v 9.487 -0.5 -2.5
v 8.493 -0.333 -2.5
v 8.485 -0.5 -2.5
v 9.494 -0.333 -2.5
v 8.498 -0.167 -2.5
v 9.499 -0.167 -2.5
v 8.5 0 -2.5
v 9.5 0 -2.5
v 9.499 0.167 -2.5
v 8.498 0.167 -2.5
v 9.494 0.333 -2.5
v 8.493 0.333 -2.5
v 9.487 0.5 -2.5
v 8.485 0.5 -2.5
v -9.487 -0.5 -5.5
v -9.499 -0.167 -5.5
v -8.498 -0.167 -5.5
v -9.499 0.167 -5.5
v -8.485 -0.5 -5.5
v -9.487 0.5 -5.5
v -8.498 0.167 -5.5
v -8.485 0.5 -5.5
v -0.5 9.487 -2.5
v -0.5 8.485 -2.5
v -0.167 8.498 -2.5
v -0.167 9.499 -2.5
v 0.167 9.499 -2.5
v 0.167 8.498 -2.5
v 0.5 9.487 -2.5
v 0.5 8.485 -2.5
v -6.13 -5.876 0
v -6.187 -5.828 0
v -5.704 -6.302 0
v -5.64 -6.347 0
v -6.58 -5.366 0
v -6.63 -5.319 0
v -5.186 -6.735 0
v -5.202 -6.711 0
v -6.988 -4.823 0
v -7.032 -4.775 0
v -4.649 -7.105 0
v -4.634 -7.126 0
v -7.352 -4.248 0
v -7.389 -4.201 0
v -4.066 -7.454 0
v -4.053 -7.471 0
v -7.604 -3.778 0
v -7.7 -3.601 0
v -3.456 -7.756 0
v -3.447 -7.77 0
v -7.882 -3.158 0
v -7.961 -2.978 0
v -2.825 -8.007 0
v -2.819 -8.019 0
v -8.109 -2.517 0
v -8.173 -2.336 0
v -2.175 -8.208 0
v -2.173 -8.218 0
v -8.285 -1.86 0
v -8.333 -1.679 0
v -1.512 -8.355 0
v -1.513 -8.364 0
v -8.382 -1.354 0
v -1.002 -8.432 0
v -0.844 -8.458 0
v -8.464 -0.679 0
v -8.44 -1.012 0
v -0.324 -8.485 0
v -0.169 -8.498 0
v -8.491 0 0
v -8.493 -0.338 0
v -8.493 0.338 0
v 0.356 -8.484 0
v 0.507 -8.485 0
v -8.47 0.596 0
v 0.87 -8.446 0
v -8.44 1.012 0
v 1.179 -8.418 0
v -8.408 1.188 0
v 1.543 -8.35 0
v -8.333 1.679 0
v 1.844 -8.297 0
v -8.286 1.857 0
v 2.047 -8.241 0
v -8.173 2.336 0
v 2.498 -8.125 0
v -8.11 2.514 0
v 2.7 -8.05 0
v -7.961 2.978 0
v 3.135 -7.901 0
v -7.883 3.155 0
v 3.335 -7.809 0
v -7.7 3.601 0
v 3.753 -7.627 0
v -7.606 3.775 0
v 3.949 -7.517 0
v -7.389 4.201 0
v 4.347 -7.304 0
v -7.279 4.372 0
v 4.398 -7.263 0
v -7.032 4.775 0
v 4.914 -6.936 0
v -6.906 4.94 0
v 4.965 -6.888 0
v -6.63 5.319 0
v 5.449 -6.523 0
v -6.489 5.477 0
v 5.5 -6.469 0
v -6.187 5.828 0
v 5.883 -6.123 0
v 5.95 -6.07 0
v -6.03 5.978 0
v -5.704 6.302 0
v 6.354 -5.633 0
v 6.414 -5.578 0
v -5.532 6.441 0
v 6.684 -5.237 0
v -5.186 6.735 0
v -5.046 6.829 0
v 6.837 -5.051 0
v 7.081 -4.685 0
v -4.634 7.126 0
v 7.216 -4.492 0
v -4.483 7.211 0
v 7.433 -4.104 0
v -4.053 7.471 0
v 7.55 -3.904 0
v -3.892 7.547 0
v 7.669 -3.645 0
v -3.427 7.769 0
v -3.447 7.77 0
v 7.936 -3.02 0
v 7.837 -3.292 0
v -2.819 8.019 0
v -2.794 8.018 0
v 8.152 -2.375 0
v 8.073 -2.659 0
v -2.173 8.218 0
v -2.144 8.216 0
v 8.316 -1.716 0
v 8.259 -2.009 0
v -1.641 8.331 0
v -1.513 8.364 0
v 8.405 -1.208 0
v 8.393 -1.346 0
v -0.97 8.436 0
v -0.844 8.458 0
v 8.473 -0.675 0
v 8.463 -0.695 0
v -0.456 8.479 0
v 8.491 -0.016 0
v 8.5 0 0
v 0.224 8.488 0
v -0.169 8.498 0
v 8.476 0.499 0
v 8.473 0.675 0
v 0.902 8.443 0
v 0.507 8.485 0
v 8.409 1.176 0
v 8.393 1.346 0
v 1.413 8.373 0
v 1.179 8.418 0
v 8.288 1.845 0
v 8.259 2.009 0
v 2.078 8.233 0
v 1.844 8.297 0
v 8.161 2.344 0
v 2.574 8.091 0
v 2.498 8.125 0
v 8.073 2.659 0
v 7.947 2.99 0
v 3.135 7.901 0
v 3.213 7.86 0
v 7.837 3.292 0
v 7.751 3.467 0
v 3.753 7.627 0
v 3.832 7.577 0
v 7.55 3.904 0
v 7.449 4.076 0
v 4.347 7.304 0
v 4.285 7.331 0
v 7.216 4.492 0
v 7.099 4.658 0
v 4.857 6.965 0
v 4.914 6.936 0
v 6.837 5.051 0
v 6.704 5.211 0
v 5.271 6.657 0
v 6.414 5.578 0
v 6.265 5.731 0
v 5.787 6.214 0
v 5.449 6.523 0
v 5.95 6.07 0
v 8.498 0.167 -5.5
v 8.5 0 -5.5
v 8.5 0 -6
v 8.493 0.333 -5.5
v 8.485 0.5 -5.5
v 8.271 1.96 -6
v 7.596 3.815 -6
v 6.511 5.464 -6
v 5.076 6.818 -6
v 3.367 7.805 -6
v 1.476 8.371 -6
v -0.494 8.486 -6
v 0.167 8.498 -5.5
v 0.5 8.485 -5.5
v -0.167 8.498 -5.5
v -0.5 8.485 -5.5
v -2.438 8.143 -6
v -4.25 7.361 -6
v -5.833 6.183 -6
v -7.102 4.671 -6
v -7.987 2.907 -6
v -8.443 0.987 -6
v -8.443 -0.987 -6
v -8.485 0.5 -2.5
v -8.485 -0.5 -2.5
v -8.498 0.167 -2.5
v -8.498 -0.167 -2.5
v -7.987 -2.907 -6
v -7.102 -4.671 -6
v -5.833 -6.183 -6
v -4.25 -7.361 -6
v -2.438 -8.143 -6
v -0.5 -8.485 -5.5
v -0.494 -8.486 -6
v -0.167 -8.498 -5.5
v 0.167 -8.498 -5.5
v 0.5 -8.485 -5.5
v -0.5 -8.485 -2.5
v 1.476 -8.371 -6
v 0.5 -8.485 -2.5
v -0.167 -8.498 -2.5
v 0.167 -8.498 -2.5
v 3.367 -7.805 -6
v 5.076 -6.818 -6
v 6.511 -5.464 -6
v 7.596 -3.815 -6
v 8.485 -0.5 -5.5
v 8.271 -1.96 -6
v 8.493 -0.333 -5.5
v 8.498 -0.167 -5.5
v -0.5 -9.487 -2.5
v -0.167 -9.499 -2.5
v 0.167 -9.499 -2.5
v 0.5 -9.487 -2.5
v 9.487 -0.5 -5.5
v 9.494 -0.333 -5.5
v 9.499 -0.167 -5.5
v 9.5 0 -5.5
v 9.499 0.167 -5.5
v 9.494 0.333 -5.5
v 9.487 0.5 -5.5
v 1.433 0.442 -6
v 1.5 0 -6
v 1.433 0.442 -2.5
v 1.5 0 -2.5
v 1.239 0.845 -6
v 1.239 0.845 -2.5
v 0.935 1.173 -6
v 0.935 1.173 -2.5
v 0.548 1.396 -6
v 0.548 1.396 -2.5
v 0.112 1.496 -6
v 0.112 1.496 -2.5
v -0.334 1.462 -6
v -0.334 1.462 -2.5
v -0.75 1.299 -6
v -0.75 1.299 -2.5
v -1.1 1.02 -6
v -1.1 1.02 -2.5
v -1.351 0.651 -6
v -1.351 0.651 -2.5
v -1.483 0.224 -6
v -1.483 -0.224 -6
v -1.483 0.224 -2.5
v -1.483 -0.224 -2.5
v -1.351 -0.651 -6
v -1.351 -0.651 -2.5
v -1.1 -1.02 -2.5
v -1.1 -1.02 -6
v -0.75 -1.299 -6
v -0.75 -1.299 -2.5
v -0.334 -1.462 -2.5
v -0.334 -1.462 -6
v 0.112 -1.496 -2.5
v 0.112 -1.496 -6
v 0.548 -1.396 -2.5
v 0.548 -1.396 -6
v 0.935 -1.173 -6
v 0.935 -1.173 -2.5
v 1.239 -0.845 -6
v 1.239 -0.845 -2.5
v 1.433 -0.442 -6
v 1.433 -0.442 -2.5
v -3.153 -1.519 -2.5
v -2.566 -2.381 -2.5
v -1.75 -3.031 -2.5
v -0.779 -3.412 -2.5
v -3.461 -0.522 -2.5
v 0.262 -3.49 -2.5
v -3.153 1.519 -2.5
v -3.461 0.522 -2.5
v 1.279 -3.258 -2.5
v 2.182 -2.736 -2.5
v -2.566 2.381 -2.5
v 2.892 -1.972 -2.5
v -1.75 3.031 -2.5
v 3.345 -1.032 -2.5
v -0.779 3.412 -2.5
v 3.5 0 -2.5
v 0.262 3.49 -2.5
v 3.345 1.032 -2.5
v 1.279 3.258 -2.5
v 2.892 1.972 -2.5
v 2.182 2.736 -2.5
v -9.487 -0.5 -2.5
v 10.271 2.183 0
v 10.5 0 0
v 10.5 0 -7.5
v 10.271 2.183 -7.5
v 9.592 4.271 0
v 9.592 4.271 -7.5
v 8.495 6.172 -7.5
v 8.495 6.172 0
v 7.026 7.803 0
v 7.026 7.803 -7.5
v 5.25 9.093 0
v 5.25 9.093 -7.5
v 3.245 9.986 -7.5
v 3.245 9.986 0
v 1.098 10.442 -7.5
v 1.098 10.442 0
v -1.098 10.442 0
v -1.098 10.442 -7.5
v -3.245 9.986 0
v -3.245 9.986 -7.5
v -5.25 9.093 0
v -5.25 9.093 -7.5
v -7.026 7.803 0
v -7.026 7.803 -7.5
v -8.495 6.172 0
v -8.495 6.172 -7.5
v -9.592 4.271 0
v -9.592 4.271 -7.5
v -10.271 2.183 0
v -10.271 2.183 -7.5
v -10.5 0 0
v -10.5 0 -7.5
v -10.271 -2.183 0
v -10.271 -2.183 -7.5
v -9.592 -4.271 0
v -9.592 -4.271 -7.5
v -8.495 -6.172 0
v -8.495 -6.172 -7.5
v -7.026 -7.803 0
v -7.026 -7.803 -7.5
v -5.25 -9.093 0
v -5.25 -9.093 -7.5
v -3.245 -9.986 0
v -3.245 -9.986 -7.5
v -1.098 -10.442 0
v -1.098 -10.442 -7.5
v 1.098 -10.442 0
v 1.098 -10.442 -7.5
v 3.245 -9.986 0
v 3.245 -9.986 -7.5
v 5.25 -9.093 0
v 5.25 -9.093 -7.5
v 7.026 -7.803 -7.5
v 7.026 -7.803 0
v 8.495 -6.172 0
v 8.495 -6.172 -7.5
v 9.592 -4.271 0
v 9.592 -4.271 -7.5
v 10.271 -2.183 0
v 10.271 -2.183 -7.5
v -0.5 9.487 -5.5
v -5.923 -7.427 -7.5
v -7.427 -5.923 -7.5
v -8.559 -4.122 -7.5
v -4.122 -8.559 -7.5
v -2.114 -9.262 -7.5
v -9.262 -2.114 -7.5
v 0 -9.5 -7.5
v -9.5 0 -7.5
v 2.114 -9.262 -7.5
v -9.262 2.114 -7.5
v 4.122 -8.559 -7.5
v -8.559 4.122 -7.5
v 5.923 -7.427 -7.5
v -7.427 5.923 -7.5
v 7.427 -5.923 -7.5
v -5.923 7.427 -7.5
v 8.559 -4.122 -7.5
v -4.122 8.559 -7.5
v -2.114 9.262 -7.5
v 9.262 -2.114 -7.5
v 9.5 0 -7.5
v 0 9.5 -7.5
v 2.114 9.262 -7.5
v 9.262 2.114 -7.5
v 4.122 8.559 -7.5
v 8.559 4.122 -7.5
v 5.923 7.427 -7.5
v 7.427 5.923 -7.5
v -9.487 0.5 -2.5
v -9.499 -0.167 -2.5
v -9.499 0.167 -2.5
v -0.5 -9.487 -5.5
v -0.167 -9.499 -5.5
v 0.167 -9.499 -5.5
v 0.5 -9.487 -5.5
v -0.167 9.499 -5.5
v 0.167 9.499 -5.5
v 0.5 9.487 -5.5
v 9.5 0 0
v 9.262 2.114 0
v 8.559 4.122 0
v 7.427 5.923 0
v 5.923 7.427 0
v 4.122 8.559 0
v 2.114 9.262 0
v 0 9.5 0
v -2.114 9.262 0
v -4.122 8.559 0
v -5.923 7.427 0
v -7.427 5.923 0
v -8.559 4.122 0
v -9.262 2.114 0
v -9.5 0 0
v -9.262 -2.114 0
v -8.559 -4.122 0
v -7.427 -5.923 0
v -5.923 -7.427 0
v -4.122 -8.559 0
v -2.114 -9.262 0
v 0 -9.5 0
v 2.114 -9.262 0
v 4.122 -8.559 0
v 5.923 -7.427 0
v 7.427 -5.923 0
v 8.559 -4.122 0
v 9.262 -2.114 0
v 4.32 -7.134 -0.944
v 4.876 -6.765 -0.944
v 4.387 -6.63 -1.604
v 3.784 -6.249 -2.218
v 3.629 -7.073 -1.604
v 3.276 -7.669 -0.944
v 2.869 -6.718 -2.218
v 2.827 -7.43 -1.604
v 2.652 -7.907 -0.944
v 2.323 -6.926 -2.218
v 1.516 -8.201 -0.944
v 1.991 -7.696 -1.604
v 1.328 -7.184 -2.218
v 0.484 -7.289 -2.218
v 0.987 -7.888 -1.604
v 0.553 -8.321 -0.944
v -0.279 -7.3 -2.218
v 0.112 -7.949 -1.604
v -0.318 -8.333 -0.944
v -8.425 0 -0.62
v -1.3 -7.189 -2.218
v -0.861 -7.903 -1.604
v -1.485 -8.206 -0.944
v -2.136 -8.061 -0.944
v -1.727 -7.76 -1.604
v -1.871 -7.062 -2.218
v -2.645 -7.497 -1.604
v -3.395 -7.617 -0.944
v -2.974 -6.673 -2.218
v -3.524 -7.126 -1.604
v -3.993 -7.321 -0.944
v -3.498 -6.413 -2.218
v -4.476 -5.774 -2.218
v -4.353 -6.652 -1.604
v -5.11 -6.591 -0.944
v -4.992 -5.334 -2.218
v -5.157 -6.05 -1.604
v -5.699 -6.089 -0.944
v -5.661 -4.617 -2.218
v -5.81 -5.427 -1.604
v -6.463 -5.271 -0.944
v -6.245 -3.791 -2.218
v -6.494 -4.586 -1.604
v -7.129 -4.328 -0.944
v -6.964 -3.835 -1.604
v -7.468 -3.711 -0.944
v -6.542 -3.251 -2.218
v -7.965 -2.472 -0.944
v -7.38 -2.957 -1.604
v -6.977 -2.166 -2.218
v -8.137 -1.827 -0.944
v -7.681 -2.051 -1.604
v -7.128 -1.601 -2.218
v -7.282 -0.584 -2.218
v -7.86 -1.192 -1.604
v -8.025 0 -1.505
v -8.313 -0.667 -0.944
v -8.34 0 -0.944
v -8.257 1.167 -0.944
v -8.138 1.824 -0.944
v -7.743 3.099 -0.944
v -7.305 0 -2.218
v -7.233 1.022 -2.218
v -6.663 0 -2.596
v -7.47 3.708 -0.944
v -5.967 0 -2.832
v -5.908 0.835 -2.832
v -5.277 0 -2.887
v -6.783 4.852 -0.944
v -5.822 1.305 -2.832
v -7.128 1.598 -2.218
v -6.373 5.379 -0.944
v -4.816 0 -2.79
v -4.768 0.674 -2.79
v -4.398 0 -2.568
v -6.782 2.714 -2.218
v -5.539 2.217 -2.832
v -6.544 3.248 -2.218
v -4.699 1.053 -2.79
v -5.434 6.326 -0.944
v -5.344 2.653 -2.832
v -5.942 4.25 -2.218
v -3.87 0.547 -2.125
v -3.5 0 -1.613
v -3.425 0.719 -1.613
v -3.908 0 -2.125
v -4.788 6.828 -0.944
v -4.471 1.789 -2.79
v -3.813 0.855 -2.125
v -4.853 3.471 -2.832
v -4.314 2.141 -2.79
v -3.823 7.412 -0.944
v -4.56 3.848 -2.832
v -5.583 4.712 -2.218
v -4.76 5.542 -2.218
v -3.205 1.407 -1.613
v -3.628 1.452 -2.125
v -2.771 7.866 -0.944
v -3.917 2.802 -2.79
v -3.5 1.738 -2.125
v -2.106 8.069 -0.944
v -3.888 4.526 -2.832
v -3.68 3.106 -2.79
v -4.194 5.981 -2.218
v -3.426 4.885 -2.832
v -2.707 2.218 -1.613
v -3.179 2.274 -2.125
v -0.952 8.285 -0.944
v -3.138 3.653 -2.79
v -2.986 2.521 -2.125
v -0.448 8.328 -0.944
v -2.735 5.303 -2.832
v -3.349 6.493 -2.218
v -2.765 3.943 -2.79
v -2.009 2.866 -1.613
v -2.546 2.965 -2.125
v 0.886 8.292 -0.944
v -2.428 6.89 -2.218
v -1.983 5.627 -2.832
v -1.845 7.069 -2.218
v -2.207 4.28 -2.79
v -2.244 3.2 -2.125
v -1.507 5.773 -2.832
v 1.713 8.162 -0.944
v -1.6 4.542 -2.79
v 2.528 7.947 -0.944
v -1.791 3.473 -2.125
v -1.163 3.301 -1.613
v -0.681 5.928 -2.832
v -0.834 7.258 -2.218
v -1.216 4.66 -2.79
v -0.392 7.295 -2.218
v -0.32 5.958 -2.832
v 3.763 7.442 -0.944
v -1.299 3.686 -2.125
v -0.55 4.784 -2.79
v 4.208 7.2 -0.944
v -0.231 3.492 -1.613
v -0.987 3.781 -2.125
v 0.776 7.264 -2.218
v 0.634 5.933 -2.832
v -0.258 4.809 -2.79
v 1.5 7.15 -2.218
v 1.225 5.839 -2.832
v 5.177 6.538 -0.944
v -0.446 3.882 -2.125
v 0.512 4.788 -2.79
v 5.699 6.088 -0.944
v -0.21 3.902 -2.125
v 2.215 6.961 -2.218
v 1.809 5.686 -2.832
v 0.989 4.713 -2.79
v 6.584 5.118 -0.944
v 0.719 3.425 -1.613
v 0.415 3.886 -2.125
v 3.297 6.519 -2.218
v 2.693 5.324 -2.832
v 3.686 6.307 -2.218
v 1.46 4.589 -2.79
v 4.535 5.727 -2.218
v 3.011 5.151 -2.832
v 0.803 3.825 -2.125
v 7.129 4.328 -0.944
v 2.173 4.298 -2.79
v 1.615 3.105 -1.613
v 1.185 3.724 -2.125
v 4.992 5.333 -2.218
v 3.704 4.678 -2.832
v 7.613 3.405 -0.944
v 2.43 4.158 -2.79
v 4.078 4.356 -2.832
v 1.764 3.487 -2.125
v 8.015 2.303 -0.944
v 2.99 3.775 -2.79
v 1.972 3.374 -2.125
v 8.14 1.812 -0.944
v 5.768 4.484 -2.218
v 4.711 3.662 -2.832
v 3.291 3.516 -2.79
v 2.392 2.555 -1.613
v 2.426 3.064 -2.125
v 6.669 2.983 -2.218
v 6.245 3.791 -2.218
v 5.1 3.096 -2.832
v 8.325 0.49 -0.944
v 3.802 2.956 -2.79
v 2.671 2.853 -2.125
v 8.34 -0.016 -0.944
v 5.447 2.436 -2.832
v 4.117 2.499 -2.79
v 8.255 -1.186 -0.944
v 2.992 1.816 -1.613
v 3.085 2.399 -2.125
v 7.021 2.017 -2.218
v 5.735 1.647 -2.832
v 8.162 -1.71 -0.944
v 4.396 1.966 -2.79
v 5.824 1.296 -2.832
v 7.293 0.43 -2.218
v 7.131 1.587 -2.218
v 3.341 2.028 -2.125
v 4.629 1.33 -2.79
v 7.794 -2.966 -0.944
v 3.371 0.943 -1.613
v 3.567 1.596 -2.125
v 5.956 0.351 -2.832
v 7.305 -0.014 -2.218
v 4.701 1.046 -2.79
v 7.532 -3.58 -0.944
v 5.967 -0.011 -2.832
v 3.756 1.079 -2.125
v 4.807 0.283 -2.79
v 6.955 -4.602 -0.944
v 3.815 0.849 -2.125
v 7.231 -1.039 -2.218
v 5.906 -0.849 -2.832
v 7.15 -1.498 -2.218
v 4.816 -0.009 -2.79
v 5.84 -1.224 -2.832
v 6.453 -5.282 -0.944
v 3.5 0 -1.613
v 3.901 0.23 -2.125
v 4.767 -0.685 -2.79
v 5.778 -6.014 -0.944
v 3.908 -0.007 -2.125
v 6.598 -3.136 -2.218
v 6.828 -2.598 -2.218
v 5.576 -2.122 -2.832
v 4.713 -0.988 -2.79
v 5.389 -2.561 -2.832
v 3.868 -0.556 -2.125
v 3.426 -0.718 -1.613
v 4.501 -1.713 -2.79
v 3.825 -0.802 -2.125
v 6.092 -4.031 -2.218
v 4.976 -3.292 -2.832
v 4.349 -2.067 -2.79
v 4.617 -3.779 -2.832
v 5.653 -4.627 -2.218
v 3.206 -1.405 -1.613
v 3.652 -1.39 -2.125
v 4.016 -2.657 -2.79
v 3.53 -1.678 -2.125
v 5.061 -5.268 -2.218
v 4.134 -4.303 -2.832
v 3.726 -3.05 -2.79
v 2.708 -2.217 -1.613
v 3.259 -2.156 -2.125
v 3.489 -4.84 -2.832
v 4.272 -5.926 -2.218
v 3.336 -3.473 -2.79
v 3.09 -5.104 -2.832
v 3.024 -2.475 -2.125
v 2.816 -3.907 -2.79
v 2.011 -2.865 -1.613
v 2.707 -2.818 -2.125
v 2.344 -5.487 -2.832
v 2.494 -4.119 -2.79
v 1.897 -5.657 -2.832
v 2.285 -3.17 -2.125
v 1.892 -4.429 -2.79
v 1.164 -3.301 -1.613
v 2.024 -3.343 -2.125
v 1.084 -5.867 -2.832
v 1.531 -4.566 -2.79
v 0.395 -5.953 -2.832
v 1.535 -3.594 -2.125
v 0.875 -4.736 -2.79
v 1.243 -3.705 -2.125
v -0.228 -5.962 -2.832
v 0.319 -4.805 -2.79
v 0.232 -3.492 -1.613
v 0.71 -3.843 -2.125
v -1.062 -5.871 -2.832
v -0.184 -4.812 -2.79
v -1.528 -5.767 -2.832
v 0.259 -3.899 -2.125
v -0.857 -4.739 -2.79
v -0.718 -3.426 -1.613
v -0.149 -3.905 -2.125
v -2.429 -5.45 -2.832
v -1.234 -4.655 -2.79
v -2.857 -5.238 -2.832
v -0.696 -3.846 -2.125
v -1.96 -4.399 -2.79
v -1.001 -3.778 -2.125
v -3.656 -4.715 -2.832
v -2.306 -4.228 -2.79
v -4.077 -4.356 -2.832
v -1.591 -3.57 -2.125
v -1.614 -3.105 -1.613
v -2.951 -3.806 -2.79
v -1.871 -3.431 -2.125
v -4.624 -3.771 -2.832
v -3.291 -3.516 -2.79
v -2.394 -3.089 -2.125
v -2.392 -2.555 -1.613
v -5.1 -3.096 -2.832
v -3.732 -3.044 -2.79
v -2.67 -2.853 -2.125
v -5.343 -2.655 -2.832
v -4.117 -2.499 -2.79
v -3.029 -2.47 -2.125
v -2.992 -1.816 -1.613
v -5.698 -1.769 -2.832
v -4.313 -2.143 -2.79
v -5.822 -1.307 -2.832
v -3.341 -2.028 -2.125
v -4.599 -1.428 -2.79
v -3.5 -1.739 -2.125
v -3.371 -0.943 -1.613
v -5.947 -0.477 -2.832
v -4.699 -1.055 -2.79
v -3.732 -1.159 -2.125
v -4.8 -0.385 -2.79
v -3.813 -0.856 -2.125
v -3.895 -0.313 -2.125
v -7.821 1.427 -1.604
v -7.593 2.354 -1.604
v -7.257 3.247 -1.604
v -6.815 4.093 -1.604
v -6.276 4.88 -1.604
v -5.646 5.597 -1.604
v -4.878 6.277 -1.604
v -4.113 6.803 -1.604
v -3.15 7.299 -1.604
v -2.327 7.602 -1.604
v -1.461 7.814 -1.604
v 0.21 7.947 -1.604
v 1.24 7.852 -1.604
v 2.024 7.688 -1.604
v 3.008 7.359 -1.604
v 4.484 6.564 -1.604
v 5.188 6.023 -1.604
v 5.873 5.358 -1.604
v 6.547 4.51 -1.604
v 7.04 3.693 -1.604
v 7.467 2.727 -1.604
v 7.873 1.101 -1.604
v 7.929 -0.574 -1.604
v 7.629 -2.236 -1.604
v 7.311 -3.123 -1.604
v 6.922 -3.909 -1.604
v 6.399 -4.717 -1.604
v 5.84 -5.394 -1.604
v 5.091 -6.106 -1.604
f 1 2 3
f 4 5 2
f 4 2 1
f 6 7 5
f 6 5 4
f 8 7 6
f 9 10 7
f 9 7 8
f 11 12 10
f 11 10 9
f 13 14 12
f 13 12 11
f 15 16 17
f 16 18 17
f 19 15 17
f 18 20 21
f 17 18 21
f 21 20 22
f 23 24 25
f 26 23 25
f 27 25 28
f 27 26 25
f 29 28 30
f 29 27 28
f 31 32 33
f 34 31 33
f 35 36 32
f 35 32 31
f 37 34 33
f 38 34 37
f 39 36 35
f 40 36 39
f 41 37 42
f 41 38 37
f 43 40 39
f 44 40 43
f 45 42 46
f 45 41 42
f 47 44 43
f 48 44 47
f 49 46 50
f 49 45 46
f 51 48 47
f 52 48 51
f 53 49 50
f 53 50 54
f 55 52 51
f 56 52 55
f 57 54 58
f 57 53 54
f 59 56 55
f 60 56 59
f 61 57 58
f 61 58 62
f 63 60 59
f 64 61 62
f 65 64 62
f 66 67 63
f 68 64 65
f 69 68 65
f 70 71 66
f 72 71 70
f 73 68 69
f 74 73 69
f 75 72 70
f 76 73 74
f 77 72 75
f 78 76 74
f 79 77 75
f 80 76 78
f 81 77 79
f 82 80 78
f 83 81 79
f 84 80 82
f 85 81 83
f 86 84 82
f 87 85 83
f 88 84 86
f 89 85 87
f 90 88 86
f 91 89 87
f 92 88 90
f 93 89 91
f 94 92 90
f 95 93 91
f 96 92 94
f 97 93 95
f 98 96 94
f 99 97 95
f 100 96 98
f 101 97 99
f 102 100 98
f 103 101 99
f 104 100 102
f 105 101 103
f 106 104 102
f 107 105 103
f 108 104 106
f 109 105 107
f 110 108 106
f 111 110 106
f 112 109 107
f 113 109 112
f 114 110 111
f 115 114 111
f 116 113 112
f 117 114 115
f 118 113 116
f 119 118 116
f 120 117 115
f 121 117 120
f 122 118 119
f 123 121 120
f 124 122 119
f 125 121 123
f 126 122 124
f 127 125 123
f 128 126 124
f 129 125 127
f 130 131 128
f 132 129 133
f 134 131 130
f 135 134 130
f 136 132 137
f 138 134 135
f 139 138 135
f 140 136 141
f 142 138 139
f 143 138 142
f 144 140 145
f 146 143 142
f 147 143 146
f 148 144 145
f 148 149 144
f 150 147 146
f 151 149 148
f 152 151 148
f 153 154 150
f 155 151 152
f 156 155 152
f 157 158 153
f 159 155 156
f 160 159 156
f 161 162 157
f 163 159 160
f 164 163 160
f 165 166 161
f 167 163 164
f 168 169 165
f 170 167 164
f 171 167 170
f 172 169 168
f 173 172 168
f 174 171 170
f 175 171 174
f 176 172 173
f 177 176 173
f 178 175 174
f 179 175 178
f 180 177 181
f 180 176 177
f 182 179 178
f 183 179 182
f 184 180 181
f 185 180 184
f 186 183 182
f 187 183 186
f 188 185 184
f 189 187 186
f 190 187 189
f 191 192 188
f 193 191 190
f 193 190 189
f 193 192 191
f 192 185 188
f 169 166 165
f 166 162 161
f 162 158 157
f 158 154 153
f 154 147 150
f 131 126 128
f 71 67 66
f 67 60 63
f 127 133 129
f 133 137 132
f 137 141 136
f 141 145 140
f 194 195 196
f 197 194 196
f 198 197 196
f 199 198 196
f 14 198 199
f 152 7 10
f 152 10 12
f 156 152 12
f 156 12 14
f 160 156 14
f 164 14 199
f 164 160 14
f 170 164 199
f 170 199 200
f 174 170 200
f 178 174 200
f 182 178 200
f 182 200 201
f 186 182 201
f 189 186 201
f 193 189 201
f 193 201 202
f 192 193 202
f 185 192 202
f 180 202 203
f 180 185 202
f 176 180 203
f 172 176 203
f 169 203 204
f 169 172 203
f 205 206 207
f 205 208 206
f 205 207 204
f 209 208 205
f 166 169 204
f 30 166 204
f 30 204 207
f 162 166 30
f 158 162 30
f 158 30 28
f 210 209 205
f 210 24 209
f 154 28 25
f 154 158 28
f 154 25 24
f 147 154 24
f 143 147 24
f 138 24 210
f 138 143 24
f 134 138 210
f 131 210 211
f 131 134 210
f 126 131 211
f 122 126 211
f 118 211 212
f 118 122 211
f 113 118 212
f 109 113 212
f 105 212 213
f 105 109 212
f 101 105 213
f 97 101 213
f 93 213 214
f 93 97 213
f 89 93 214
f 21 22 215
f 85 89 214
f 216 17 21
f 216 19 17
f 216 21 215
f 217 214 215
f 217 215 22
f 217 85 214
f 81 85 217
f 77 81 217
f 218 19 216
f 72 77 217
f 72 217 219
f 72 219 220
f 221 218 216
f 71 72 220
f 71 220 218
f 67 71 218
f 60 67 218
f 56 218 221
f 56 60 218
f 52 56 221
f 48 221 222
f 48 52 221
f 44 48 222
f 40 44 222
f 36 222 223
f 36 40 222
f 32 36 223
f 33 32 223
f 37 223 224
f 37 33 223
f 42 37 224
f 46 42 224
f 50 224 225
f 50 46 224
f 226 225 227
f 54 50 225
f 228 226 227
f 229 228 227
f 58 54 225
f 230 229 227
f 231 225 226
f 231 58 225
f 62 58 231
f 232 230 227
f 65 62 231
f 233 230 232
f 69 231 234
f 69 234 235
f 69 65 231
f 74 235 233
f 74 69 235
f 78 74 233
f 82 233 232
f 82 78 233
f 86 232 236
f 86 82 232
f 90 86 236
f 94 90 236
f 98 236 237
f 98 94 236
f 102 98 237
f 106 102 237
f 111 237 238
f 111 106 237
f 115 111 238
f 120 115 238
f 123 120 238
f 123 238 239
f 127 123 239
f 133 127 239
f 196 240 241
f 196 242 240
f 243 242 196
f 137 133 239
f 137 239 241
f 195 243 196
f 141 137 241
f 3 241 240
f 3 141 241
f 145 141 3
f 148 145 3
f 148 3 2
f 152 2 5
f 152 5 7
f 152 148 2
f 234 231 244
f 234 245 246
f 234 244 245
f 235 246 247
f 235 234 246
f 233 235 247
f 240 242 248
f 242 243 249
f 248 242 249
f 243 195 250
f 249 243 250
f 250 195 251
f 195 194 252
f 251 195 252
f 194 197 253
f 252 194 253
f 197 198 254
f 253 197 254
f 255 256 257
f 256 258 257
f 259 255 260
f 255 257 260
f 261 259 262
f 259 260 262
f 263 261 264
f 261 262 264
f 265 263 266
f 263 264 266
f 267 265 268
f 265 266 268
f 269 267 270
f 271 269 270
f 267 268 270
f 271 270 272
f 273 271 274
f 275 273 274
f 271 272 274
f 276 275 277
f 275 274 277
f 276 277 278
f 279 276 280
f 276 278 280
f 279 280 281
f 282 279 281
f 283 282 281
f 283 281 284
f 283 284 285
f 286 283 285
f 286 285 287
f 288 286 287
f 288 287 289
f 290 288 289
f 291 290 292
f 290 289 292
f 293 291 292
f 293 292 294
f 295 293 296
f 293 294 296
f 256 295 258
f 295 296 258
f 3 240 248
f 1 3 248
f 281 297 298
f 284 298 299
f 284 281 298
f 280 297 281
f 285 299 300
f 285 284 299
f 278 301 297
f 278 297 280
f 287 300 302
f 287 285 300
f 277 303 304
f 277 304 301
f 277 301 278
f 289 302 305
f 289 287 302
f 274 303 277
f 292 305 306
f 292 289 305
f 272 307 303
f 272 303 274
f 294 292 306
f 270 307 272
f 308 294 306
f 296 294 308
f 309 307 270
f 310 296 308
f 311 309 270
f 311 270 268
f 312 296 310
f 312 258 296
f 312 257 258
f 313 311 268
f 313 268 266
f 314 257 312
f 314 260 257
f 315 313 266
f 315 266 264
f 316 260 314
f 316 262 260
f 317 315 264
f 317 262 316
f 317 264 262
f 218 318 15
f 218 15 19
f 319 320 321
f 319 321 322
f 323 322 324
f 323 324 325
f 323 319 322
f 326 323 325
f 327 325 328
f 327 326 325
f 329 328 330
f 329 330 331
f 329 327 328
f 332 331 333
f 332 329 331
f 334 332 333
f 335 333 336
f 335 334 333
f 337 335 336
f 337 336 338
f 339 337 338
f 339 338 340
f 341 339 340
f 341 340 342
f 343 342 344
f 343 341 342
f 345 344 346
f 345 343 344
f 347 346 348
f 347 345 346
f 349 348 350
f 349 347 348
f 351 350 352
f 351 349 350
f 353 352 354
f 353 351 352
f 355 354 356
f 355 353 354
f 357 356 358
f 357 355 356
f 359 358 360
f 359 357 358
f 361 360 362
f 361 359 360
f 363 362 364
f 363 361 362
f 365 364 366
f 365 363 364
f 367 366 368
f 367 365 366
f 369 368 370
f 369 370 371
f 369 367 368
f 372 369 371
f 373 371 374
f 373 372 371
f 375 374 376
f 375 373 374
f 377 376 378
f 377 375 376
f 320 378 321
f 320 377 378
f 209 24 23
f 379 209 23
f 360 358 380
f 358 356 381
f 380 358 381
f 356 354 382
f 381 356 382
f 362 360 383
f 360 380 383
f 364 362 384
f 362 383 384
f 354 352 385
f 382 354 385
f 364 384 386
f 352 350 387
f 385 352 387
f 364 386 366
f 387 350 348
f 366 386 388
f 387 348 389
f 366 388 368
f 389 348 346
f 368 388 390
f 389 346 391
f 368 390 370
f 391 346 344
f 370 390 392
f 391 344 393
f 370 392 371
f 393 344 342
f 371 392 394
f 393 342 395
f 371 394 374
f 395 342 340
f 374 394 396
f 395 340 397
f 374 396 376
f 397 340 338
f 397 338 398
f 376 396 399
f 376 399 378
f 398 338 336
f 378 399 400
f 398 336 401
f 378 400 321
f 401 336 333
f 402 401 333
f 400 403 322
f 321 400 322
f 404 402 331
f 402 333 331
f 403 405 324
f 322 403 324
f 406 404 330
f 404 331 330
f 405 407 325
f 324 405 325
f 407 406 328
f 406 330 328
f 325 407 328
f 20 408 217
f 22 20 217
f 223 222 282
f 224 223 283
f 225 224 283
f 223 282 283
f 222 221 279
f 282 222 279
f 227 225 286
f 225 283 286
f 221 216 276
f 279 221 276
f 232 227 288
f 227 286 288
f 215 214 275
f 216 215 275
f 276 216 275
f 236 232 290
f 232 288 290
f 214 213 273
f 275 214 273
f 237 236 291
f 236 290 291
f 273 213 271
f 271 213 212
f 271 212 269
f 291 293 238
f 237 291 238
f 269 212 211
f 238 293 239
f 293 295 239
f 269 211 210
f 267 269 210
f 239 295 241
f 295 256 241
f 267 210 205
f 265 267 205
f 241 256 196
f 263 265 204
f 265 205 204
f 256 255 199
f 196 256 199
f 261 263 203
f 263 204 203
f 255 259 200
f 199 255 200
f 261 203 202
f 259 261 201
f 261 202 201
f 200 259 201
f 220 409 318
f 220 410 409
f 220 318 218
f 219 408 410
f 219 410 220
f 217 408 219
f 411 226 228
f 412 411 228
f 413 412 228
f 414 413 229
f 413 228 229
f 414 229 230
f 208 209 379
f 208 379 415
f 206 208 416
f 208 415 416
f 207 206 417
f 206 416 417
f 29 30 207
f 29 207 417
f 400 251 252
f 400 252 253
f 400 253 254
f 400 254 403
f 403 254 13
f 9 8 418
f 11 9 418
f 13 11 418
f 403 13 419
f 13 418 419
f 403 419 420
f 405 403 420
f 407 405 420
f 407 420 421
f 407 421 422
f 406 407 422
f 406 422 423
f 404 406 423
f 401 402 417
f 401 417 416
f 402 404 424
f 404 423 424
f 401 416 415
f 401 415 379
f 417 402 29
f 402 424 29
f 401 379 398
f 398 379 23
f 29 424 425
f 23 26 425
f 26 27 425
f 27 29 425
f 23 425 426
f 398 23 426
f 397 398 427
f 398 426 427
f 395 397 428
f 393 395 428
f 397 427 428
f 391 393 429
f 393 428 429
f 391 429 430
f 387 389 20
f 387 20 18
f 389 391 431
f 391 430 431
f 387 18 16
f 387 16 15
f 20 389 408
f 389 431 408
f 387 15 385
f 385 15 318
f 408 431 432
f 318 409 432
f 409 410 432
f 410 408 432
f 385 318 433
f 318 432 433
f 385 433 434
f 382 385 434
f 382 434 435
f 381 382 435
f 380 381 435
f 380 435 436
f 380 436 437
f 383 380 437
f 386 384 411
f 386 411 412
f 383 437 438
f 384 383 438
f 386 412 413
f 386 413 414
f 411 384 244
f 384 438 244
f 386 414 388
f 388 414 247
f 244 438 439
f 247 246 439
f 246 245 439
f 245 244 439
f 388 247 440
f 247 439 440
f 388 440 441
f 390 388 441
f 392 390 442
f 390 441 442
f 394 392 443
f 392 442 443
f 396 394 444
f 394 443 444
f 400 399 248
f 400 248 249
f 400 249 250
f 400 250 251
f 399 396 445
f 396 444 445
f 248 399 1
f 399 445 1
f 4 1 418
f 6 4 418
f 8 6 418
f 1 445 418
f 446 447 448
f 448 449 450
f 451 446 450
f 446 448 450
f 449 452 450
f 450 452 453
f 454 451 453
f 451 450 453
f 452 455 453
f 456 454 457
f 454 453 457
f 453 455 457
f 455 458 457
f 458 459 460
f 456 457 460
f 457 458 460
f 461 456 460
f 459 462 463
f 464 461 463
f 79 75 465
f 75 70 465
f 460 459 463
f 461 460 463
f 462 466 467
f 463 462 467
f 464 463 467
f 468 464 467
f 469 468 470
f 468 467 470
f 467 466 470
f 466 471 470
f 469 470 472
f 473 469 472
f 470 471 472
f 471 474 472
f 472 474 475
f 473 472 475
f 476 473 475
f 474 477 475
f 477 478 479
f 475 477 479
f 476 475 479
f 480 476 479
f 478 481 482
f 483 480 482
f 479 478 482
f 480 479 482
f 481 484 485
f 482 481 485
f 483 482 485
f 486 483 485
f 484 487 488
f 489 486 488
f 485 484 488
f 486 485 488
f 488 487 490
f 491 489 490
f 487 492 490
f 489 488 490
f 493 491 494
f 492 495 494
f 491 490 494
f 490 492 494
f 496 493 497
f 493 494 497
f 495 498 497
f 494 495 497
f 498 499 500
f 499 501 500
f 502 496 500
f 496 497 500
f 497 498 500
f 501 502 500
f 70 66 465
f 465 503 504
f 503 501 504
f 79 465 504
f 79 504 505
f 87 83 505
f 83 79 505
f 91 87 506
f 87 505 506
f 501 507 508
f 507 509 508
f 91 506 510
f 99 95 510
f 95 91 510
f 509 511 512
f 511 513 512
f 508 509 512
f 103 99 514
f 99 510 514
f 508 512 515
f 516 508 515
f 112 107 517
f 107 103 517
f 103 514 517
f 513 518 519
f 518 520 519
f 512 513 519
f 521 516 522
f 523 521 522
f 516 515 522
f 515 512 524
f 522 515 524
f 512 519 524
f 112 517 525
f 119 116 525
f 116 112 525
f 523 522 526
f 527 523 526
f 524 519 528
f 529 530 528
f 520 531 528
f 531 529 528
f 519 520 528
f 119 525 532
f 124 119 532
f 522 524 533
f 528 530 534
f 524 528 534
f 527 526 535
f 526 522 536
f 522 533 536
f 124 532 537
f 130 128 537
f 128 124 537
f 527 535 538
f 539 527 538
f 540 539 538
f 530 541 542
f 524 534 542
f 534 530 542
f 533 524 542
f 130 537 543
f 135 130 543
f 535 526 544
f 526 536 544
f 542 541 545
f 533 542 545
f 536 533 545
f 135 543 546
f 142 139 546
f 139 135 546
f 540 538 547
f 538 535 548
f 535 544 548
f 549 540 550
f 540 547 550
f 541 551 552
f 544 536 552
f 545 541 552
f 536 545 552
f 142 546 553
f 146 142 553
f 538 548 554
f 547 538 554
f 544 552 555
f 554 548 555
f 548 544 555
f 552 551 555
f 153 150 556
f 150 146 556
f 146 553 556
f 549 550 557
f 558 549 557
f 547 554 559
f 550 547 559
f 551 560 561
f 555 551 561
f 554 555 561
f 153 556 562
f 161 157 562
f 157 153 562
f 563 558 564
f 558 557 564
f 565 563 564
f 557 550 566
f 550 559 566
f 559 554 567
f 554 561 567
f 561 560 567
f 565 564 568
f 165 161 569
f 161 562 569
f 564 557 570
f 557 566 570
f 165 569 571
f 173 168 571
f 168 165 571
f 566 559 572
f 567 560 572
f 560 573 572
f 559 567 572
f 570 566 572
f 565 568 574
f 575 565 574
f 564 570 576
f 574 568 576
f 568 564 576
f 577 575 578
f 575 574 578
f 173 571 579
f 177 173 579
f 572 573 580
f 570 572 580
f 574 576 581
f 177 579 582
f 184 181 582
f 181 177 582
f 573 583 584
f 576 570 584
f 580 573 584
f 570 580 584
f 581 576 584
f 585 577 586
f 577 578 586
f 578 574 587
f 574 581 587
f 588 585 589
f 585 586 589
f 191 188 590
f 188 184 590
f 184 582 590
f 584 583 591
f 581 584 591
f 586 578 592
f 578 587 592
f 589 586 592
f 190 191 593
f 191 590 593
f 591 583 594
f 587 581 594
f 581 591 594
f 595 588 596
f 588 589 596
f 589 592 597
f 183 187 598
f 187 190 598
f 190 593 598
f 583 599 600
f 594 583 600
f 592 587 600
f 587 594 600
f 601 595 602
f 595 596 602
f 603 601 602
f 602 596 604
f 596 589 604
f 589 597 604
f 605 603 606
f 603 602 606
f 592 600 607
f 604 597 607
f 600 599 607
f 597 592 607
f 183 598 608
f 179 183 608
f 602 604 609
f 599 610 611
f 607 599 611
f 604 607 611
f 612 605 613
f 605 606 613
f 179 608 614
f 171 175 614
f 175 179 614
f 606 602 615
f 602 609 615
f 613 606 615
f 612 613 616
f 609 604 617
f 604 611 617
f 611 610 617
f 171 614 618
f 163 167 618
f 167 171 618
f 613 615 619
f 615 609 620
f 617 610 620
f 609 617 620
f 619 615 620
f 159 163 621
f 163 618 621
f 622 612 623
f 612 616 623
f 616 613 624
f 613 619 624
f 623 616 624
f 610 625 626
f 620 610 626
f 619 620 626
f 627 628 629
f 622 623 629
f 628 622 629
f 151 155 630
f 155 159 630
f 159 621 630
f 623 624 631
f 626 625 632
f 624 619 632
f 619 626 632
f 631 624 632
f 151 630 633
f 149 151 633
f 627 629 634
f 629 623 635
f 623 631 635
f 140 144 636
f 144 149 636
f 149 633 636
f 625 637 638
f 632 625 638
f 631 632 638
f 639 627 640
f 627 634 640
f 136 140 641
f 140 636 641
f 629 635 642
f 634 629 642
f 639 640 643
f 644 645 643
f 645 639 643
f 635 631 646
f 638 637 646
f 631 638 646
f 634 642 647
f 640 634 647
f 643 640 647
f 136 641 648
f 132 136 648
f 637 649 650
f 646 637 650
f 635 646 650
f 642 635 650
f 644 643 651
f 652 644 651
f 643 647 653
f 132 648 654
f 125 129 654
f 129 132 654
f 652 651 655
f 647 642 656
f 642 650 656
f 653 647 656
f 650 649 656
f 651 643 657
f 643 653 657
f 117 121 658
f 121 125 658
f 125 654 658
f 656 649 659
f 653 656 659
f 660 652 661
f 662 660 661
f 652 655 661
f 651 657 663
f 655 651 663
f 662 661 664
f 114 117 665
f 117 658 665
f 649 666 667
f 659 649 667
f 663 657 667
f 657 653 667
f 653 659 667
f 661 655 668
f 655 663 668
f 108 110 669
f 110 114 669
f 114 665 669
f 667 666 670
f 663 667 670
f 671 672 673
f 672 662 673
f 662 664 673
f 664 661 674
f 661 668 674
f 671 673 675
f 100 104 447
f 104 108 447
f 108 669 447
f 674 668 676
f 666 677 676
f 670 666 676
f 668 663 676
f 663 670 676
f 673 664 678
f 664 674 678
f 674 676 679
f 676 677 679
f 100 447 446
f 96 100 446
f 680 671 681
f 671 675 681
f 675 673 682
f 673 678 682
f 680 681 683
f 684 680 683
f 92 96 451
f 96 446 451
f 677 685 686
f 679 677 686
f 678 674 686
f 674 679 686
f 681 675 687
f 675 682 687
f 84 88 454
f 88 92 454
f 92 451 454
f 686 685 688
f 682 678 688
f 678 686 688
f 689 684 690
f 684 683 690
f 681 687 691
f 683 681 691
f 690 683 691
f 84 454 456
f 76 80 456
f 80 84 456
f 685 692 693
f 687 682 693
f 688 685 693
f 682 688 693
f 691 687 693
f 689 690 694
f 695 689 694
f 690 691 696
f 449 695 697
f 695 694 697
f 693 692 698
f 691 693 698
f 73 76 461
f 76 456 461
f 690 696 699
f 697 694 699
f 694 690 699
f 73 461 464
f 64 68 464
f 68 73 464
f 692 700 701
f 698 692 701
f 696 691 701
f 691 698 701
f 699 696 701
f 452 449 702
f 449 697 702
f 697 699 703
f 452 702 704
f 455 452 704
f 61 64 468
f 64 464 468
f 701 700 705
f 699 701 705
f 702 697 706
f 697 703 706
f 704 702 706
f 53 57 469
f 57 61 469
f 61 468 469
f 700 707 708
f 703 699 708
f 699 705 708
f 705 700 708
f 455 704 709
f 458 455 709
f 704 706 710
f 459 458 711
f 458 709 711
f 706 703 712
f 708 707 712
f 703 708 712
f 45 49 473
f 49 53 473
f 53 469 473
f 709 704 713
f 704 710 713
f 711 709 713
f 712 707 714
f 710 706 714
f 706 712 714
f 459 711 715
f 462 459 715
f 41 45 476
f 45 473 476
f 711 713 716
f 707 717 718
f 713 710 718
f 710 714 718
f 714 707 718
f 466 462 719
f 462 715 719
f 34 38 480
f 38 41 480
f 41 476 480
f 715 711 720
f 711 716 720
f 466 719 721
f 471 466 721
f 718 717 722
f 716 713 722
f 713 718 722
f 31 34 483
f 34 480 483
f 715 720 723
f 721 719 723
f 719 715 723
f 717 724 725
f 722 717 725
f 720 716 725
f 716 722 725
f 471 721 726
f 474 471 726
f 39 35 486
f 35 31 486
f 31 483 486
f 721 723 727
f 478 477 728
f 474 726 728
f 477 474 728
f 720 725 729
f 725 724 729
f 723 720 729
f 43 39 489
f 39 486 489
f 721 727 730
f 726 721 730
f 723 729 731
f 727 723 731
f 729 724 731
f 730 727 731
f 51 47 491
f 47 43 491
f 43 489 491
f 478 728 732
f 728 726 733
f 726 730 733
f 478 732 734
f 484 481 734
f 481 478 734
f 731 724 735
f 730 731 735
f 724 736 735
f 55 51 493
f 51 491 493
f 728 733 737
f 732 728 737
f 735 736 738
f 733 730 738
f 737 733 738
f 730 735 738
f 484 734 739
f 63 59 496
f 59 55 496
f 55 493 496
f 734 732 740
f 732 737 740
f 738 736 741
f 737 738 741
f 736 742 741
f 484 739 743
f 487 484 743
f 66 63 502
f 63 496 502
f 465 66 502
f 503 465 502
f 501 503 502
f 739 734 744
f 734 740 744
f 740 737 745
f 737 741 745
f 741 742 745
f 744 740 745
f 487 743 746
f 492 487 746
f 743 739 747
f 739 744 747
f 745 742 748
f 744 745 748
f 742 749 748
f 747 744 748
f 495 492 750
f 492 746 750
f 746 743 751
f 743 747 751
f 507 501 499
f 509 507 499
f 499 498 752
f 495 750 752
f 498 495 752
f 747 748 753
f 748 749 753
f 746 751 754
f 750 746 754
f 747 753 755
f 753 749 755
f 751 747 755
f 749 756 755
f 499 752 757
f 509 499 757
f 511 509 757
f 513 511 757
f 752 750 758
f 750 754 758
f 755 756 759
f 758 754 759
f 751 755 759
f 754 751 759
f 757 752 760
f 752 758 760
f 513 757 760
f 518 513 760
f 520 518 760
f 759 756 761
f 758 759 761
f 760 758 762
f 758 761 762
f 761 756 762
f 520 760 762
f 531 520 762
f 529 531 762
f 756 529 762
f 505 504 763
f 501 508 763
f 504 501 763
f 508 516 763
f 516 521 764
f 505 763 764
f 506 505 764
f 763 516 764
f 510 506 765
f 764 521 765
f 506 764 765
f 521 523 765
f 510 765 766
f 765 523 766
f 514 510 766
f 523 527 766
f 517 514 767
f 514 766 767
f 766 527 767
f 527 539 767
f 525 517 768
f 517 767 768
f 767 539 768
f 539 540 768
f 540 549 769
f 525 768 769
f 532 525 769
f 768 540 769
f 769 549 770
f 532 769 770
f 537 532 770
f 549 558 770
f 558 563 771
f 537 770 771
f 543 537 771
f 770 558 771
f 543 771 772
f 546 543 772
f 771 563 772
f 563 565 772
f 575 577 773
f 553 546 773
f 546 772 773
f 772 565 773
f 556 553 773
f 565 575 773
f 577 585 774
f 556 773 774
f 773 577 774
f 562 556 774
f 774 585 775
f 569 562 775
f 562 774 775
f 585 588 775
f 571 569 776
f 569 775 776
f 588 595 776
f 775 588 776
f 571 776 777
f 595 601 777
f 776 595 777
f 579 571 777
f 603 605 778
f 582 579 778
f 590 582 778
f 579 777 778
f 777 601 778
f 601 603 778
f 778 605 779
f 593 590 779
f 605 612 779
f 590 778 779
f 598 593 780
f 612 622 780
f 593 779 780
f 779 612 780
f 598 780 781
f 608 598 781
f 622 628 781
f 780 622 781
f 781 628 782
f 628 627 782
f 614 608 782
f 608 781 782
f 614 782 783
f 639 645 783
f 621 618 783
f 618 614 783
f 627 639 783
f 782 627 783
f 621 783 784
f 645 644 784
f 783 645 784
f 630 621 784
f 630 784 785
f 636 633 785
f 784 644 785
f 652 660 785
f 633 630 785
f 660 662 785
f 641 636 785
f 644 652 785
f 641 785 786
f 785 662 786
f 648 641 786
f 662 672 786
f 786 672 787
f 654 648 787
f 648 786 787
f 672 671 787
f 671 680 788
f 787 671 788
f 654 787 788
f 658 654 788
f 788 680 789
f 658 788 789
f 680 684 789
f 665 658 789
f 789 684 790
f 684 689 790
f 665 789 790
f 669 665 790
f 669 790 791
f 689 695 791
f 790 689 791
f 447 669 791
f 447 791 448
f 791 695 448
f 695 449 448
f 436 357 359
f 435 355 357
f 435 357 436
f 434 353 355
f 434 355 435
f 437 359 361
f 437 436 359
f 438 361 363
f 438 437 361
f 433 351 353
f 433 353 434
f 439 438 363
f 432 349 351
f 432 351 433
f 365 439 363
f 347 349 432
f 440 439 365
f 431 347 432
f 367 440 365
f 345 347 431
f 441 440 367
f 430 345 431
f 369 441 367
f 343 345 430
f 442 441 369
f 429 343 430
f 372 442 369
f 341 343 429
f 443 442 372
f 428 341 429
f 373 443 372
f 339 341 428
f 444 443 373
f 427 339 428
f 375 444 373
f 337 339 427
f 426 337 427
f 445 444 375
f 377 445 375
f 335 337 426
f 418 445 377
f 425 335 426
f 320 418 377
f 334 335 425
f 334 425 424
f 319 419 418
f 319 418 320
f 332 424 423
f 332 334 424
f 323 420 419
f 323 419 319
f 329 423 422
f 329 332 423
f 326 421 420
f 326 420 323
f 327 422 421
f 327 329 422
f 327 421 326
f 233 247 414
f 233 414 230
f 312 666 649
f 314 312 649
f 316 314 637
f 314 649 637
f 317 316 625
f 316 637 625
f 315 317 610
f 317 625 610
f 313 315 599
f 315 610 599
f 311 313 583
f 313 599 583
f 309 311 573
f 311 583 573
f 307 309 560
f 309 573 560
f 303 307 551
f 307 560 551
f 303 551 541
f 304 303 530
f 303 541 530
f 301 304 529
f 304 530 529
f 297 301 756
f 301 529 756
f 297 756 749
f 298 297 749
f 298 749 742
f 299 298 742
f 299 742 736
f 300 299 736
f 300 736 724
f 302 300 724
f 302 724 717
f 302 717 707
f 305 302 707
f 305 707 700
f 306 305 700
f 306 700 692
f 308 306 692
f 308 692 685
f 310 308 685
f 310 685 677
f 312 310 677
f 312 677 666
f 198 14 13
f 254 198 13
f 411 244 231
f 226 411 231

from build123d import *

# Parameters (mm, degrees)
F0_R      = 10.5
F0_R_2    = 9.5
F1_DEPTH  = 7.5
F0_R_3    = 8.5
F0_R_4    = 3.5
F2_DEPTH  = 6
F5_W      = 9
F5_H      = 1
F5_W_2    = 1
F5_H_2    = 9
F6_DEPTH  = 3
F8_R      = 3.5
F8_R_2    = 1.5
F9_DEPTH  = 3.5
F0_R_5    = 1.5
F10_DEPTH = 6


with BuildPart() as f1:
    # F0 (on Top) → F1 (new body)
    with BuildSketch(Plane.XY):
        Circle(F0_R)
        Circle(F0_R_2, mode=Mode.SUBTRACT)
    extrude(amount=-F1_DEPTH)



with BuildPart() as f2:
    # F0 (on Top) → F2 (new body)
    with BuildSketch(Plane.XY):
        Circle(F0_R_3)
        Circle(F0_R_4, mode=Mode.SUBTRACT)
    extrude(amount=-F2_DEPTH)


with BuildPart() as f1_1:
    add(f1.part)

    add(f2.part)  # F6 merges F2
    # F5 (on offset) → F6 (join)
    with BuildSketch(Plane.XY.offset(-2.5)):
        with Locations((-5, 0)):
            Rectangle(F5_W, F5_H)
        with Locations((0, 5)):
            Rectangle(F5_W_2, F5_H_2)
        Rectangle(F5_W_2, F5_H)
        with Locations((5, 0)):
            Rectangle(F5_W, F5_H)
        with Locations((0, -5)):
            Rectangle(F5_W_2, F5_H_2)
    extrude(amount=-F6_DEPTH)

    # F3 (on Front) → F7 (revolve, cut)
    with BuildSketch(Plane.XZ):
        with BuildLine():
            Line((0, 0.069658272), (-8.4977783263, 0.0271935514))
            add(Edge.make_bspline(
                [(-8.4977783263, 0.0271935514), (-8.4390711904, -0.1936509699), (-8.5319644113, -0.9331612071), (-7.3101581266, -2.5228604066), (-4.8192842499, -3.2569469358), (-3.4470196357, -1.6163358317), (-2.5980696171, -0.2120298583), (-0.5223557571, -0.492685907), (0, -0.1791804971)],
                knots=[0, 0, 0, 0, 0.1159478411, 0.2887836686, 0.4788440423, 0.6507860288, 0.8064986974, 1, 1, 1, 1], degree=3))
            Line((0, -0.1791804971), (0, 0.069658272))
        make_face()
    revolve(axis=Axis((0, 0, 0.069658272), (0, 0, -1)), mode=Mode.SUBTRACT)

    # F8 (on offset) → F9 (join, through all)
    with BuildSketch(Plane.XY.offset(-2.5)):
        Circle(F8_R)
        Circle(F8_R_2, mode=Mode.SUBTRACT)
    extrude(amount=-F9_DEPTH)

    # F0 (on Top) → F10 (cut, through all)
    with BuildSketch(Plane.XY):
        Circle(F0_R_5)
    extrude(amount=-F10_DEPTH, mode=Mode.SUBTRACT)


solid = f1_1.part
